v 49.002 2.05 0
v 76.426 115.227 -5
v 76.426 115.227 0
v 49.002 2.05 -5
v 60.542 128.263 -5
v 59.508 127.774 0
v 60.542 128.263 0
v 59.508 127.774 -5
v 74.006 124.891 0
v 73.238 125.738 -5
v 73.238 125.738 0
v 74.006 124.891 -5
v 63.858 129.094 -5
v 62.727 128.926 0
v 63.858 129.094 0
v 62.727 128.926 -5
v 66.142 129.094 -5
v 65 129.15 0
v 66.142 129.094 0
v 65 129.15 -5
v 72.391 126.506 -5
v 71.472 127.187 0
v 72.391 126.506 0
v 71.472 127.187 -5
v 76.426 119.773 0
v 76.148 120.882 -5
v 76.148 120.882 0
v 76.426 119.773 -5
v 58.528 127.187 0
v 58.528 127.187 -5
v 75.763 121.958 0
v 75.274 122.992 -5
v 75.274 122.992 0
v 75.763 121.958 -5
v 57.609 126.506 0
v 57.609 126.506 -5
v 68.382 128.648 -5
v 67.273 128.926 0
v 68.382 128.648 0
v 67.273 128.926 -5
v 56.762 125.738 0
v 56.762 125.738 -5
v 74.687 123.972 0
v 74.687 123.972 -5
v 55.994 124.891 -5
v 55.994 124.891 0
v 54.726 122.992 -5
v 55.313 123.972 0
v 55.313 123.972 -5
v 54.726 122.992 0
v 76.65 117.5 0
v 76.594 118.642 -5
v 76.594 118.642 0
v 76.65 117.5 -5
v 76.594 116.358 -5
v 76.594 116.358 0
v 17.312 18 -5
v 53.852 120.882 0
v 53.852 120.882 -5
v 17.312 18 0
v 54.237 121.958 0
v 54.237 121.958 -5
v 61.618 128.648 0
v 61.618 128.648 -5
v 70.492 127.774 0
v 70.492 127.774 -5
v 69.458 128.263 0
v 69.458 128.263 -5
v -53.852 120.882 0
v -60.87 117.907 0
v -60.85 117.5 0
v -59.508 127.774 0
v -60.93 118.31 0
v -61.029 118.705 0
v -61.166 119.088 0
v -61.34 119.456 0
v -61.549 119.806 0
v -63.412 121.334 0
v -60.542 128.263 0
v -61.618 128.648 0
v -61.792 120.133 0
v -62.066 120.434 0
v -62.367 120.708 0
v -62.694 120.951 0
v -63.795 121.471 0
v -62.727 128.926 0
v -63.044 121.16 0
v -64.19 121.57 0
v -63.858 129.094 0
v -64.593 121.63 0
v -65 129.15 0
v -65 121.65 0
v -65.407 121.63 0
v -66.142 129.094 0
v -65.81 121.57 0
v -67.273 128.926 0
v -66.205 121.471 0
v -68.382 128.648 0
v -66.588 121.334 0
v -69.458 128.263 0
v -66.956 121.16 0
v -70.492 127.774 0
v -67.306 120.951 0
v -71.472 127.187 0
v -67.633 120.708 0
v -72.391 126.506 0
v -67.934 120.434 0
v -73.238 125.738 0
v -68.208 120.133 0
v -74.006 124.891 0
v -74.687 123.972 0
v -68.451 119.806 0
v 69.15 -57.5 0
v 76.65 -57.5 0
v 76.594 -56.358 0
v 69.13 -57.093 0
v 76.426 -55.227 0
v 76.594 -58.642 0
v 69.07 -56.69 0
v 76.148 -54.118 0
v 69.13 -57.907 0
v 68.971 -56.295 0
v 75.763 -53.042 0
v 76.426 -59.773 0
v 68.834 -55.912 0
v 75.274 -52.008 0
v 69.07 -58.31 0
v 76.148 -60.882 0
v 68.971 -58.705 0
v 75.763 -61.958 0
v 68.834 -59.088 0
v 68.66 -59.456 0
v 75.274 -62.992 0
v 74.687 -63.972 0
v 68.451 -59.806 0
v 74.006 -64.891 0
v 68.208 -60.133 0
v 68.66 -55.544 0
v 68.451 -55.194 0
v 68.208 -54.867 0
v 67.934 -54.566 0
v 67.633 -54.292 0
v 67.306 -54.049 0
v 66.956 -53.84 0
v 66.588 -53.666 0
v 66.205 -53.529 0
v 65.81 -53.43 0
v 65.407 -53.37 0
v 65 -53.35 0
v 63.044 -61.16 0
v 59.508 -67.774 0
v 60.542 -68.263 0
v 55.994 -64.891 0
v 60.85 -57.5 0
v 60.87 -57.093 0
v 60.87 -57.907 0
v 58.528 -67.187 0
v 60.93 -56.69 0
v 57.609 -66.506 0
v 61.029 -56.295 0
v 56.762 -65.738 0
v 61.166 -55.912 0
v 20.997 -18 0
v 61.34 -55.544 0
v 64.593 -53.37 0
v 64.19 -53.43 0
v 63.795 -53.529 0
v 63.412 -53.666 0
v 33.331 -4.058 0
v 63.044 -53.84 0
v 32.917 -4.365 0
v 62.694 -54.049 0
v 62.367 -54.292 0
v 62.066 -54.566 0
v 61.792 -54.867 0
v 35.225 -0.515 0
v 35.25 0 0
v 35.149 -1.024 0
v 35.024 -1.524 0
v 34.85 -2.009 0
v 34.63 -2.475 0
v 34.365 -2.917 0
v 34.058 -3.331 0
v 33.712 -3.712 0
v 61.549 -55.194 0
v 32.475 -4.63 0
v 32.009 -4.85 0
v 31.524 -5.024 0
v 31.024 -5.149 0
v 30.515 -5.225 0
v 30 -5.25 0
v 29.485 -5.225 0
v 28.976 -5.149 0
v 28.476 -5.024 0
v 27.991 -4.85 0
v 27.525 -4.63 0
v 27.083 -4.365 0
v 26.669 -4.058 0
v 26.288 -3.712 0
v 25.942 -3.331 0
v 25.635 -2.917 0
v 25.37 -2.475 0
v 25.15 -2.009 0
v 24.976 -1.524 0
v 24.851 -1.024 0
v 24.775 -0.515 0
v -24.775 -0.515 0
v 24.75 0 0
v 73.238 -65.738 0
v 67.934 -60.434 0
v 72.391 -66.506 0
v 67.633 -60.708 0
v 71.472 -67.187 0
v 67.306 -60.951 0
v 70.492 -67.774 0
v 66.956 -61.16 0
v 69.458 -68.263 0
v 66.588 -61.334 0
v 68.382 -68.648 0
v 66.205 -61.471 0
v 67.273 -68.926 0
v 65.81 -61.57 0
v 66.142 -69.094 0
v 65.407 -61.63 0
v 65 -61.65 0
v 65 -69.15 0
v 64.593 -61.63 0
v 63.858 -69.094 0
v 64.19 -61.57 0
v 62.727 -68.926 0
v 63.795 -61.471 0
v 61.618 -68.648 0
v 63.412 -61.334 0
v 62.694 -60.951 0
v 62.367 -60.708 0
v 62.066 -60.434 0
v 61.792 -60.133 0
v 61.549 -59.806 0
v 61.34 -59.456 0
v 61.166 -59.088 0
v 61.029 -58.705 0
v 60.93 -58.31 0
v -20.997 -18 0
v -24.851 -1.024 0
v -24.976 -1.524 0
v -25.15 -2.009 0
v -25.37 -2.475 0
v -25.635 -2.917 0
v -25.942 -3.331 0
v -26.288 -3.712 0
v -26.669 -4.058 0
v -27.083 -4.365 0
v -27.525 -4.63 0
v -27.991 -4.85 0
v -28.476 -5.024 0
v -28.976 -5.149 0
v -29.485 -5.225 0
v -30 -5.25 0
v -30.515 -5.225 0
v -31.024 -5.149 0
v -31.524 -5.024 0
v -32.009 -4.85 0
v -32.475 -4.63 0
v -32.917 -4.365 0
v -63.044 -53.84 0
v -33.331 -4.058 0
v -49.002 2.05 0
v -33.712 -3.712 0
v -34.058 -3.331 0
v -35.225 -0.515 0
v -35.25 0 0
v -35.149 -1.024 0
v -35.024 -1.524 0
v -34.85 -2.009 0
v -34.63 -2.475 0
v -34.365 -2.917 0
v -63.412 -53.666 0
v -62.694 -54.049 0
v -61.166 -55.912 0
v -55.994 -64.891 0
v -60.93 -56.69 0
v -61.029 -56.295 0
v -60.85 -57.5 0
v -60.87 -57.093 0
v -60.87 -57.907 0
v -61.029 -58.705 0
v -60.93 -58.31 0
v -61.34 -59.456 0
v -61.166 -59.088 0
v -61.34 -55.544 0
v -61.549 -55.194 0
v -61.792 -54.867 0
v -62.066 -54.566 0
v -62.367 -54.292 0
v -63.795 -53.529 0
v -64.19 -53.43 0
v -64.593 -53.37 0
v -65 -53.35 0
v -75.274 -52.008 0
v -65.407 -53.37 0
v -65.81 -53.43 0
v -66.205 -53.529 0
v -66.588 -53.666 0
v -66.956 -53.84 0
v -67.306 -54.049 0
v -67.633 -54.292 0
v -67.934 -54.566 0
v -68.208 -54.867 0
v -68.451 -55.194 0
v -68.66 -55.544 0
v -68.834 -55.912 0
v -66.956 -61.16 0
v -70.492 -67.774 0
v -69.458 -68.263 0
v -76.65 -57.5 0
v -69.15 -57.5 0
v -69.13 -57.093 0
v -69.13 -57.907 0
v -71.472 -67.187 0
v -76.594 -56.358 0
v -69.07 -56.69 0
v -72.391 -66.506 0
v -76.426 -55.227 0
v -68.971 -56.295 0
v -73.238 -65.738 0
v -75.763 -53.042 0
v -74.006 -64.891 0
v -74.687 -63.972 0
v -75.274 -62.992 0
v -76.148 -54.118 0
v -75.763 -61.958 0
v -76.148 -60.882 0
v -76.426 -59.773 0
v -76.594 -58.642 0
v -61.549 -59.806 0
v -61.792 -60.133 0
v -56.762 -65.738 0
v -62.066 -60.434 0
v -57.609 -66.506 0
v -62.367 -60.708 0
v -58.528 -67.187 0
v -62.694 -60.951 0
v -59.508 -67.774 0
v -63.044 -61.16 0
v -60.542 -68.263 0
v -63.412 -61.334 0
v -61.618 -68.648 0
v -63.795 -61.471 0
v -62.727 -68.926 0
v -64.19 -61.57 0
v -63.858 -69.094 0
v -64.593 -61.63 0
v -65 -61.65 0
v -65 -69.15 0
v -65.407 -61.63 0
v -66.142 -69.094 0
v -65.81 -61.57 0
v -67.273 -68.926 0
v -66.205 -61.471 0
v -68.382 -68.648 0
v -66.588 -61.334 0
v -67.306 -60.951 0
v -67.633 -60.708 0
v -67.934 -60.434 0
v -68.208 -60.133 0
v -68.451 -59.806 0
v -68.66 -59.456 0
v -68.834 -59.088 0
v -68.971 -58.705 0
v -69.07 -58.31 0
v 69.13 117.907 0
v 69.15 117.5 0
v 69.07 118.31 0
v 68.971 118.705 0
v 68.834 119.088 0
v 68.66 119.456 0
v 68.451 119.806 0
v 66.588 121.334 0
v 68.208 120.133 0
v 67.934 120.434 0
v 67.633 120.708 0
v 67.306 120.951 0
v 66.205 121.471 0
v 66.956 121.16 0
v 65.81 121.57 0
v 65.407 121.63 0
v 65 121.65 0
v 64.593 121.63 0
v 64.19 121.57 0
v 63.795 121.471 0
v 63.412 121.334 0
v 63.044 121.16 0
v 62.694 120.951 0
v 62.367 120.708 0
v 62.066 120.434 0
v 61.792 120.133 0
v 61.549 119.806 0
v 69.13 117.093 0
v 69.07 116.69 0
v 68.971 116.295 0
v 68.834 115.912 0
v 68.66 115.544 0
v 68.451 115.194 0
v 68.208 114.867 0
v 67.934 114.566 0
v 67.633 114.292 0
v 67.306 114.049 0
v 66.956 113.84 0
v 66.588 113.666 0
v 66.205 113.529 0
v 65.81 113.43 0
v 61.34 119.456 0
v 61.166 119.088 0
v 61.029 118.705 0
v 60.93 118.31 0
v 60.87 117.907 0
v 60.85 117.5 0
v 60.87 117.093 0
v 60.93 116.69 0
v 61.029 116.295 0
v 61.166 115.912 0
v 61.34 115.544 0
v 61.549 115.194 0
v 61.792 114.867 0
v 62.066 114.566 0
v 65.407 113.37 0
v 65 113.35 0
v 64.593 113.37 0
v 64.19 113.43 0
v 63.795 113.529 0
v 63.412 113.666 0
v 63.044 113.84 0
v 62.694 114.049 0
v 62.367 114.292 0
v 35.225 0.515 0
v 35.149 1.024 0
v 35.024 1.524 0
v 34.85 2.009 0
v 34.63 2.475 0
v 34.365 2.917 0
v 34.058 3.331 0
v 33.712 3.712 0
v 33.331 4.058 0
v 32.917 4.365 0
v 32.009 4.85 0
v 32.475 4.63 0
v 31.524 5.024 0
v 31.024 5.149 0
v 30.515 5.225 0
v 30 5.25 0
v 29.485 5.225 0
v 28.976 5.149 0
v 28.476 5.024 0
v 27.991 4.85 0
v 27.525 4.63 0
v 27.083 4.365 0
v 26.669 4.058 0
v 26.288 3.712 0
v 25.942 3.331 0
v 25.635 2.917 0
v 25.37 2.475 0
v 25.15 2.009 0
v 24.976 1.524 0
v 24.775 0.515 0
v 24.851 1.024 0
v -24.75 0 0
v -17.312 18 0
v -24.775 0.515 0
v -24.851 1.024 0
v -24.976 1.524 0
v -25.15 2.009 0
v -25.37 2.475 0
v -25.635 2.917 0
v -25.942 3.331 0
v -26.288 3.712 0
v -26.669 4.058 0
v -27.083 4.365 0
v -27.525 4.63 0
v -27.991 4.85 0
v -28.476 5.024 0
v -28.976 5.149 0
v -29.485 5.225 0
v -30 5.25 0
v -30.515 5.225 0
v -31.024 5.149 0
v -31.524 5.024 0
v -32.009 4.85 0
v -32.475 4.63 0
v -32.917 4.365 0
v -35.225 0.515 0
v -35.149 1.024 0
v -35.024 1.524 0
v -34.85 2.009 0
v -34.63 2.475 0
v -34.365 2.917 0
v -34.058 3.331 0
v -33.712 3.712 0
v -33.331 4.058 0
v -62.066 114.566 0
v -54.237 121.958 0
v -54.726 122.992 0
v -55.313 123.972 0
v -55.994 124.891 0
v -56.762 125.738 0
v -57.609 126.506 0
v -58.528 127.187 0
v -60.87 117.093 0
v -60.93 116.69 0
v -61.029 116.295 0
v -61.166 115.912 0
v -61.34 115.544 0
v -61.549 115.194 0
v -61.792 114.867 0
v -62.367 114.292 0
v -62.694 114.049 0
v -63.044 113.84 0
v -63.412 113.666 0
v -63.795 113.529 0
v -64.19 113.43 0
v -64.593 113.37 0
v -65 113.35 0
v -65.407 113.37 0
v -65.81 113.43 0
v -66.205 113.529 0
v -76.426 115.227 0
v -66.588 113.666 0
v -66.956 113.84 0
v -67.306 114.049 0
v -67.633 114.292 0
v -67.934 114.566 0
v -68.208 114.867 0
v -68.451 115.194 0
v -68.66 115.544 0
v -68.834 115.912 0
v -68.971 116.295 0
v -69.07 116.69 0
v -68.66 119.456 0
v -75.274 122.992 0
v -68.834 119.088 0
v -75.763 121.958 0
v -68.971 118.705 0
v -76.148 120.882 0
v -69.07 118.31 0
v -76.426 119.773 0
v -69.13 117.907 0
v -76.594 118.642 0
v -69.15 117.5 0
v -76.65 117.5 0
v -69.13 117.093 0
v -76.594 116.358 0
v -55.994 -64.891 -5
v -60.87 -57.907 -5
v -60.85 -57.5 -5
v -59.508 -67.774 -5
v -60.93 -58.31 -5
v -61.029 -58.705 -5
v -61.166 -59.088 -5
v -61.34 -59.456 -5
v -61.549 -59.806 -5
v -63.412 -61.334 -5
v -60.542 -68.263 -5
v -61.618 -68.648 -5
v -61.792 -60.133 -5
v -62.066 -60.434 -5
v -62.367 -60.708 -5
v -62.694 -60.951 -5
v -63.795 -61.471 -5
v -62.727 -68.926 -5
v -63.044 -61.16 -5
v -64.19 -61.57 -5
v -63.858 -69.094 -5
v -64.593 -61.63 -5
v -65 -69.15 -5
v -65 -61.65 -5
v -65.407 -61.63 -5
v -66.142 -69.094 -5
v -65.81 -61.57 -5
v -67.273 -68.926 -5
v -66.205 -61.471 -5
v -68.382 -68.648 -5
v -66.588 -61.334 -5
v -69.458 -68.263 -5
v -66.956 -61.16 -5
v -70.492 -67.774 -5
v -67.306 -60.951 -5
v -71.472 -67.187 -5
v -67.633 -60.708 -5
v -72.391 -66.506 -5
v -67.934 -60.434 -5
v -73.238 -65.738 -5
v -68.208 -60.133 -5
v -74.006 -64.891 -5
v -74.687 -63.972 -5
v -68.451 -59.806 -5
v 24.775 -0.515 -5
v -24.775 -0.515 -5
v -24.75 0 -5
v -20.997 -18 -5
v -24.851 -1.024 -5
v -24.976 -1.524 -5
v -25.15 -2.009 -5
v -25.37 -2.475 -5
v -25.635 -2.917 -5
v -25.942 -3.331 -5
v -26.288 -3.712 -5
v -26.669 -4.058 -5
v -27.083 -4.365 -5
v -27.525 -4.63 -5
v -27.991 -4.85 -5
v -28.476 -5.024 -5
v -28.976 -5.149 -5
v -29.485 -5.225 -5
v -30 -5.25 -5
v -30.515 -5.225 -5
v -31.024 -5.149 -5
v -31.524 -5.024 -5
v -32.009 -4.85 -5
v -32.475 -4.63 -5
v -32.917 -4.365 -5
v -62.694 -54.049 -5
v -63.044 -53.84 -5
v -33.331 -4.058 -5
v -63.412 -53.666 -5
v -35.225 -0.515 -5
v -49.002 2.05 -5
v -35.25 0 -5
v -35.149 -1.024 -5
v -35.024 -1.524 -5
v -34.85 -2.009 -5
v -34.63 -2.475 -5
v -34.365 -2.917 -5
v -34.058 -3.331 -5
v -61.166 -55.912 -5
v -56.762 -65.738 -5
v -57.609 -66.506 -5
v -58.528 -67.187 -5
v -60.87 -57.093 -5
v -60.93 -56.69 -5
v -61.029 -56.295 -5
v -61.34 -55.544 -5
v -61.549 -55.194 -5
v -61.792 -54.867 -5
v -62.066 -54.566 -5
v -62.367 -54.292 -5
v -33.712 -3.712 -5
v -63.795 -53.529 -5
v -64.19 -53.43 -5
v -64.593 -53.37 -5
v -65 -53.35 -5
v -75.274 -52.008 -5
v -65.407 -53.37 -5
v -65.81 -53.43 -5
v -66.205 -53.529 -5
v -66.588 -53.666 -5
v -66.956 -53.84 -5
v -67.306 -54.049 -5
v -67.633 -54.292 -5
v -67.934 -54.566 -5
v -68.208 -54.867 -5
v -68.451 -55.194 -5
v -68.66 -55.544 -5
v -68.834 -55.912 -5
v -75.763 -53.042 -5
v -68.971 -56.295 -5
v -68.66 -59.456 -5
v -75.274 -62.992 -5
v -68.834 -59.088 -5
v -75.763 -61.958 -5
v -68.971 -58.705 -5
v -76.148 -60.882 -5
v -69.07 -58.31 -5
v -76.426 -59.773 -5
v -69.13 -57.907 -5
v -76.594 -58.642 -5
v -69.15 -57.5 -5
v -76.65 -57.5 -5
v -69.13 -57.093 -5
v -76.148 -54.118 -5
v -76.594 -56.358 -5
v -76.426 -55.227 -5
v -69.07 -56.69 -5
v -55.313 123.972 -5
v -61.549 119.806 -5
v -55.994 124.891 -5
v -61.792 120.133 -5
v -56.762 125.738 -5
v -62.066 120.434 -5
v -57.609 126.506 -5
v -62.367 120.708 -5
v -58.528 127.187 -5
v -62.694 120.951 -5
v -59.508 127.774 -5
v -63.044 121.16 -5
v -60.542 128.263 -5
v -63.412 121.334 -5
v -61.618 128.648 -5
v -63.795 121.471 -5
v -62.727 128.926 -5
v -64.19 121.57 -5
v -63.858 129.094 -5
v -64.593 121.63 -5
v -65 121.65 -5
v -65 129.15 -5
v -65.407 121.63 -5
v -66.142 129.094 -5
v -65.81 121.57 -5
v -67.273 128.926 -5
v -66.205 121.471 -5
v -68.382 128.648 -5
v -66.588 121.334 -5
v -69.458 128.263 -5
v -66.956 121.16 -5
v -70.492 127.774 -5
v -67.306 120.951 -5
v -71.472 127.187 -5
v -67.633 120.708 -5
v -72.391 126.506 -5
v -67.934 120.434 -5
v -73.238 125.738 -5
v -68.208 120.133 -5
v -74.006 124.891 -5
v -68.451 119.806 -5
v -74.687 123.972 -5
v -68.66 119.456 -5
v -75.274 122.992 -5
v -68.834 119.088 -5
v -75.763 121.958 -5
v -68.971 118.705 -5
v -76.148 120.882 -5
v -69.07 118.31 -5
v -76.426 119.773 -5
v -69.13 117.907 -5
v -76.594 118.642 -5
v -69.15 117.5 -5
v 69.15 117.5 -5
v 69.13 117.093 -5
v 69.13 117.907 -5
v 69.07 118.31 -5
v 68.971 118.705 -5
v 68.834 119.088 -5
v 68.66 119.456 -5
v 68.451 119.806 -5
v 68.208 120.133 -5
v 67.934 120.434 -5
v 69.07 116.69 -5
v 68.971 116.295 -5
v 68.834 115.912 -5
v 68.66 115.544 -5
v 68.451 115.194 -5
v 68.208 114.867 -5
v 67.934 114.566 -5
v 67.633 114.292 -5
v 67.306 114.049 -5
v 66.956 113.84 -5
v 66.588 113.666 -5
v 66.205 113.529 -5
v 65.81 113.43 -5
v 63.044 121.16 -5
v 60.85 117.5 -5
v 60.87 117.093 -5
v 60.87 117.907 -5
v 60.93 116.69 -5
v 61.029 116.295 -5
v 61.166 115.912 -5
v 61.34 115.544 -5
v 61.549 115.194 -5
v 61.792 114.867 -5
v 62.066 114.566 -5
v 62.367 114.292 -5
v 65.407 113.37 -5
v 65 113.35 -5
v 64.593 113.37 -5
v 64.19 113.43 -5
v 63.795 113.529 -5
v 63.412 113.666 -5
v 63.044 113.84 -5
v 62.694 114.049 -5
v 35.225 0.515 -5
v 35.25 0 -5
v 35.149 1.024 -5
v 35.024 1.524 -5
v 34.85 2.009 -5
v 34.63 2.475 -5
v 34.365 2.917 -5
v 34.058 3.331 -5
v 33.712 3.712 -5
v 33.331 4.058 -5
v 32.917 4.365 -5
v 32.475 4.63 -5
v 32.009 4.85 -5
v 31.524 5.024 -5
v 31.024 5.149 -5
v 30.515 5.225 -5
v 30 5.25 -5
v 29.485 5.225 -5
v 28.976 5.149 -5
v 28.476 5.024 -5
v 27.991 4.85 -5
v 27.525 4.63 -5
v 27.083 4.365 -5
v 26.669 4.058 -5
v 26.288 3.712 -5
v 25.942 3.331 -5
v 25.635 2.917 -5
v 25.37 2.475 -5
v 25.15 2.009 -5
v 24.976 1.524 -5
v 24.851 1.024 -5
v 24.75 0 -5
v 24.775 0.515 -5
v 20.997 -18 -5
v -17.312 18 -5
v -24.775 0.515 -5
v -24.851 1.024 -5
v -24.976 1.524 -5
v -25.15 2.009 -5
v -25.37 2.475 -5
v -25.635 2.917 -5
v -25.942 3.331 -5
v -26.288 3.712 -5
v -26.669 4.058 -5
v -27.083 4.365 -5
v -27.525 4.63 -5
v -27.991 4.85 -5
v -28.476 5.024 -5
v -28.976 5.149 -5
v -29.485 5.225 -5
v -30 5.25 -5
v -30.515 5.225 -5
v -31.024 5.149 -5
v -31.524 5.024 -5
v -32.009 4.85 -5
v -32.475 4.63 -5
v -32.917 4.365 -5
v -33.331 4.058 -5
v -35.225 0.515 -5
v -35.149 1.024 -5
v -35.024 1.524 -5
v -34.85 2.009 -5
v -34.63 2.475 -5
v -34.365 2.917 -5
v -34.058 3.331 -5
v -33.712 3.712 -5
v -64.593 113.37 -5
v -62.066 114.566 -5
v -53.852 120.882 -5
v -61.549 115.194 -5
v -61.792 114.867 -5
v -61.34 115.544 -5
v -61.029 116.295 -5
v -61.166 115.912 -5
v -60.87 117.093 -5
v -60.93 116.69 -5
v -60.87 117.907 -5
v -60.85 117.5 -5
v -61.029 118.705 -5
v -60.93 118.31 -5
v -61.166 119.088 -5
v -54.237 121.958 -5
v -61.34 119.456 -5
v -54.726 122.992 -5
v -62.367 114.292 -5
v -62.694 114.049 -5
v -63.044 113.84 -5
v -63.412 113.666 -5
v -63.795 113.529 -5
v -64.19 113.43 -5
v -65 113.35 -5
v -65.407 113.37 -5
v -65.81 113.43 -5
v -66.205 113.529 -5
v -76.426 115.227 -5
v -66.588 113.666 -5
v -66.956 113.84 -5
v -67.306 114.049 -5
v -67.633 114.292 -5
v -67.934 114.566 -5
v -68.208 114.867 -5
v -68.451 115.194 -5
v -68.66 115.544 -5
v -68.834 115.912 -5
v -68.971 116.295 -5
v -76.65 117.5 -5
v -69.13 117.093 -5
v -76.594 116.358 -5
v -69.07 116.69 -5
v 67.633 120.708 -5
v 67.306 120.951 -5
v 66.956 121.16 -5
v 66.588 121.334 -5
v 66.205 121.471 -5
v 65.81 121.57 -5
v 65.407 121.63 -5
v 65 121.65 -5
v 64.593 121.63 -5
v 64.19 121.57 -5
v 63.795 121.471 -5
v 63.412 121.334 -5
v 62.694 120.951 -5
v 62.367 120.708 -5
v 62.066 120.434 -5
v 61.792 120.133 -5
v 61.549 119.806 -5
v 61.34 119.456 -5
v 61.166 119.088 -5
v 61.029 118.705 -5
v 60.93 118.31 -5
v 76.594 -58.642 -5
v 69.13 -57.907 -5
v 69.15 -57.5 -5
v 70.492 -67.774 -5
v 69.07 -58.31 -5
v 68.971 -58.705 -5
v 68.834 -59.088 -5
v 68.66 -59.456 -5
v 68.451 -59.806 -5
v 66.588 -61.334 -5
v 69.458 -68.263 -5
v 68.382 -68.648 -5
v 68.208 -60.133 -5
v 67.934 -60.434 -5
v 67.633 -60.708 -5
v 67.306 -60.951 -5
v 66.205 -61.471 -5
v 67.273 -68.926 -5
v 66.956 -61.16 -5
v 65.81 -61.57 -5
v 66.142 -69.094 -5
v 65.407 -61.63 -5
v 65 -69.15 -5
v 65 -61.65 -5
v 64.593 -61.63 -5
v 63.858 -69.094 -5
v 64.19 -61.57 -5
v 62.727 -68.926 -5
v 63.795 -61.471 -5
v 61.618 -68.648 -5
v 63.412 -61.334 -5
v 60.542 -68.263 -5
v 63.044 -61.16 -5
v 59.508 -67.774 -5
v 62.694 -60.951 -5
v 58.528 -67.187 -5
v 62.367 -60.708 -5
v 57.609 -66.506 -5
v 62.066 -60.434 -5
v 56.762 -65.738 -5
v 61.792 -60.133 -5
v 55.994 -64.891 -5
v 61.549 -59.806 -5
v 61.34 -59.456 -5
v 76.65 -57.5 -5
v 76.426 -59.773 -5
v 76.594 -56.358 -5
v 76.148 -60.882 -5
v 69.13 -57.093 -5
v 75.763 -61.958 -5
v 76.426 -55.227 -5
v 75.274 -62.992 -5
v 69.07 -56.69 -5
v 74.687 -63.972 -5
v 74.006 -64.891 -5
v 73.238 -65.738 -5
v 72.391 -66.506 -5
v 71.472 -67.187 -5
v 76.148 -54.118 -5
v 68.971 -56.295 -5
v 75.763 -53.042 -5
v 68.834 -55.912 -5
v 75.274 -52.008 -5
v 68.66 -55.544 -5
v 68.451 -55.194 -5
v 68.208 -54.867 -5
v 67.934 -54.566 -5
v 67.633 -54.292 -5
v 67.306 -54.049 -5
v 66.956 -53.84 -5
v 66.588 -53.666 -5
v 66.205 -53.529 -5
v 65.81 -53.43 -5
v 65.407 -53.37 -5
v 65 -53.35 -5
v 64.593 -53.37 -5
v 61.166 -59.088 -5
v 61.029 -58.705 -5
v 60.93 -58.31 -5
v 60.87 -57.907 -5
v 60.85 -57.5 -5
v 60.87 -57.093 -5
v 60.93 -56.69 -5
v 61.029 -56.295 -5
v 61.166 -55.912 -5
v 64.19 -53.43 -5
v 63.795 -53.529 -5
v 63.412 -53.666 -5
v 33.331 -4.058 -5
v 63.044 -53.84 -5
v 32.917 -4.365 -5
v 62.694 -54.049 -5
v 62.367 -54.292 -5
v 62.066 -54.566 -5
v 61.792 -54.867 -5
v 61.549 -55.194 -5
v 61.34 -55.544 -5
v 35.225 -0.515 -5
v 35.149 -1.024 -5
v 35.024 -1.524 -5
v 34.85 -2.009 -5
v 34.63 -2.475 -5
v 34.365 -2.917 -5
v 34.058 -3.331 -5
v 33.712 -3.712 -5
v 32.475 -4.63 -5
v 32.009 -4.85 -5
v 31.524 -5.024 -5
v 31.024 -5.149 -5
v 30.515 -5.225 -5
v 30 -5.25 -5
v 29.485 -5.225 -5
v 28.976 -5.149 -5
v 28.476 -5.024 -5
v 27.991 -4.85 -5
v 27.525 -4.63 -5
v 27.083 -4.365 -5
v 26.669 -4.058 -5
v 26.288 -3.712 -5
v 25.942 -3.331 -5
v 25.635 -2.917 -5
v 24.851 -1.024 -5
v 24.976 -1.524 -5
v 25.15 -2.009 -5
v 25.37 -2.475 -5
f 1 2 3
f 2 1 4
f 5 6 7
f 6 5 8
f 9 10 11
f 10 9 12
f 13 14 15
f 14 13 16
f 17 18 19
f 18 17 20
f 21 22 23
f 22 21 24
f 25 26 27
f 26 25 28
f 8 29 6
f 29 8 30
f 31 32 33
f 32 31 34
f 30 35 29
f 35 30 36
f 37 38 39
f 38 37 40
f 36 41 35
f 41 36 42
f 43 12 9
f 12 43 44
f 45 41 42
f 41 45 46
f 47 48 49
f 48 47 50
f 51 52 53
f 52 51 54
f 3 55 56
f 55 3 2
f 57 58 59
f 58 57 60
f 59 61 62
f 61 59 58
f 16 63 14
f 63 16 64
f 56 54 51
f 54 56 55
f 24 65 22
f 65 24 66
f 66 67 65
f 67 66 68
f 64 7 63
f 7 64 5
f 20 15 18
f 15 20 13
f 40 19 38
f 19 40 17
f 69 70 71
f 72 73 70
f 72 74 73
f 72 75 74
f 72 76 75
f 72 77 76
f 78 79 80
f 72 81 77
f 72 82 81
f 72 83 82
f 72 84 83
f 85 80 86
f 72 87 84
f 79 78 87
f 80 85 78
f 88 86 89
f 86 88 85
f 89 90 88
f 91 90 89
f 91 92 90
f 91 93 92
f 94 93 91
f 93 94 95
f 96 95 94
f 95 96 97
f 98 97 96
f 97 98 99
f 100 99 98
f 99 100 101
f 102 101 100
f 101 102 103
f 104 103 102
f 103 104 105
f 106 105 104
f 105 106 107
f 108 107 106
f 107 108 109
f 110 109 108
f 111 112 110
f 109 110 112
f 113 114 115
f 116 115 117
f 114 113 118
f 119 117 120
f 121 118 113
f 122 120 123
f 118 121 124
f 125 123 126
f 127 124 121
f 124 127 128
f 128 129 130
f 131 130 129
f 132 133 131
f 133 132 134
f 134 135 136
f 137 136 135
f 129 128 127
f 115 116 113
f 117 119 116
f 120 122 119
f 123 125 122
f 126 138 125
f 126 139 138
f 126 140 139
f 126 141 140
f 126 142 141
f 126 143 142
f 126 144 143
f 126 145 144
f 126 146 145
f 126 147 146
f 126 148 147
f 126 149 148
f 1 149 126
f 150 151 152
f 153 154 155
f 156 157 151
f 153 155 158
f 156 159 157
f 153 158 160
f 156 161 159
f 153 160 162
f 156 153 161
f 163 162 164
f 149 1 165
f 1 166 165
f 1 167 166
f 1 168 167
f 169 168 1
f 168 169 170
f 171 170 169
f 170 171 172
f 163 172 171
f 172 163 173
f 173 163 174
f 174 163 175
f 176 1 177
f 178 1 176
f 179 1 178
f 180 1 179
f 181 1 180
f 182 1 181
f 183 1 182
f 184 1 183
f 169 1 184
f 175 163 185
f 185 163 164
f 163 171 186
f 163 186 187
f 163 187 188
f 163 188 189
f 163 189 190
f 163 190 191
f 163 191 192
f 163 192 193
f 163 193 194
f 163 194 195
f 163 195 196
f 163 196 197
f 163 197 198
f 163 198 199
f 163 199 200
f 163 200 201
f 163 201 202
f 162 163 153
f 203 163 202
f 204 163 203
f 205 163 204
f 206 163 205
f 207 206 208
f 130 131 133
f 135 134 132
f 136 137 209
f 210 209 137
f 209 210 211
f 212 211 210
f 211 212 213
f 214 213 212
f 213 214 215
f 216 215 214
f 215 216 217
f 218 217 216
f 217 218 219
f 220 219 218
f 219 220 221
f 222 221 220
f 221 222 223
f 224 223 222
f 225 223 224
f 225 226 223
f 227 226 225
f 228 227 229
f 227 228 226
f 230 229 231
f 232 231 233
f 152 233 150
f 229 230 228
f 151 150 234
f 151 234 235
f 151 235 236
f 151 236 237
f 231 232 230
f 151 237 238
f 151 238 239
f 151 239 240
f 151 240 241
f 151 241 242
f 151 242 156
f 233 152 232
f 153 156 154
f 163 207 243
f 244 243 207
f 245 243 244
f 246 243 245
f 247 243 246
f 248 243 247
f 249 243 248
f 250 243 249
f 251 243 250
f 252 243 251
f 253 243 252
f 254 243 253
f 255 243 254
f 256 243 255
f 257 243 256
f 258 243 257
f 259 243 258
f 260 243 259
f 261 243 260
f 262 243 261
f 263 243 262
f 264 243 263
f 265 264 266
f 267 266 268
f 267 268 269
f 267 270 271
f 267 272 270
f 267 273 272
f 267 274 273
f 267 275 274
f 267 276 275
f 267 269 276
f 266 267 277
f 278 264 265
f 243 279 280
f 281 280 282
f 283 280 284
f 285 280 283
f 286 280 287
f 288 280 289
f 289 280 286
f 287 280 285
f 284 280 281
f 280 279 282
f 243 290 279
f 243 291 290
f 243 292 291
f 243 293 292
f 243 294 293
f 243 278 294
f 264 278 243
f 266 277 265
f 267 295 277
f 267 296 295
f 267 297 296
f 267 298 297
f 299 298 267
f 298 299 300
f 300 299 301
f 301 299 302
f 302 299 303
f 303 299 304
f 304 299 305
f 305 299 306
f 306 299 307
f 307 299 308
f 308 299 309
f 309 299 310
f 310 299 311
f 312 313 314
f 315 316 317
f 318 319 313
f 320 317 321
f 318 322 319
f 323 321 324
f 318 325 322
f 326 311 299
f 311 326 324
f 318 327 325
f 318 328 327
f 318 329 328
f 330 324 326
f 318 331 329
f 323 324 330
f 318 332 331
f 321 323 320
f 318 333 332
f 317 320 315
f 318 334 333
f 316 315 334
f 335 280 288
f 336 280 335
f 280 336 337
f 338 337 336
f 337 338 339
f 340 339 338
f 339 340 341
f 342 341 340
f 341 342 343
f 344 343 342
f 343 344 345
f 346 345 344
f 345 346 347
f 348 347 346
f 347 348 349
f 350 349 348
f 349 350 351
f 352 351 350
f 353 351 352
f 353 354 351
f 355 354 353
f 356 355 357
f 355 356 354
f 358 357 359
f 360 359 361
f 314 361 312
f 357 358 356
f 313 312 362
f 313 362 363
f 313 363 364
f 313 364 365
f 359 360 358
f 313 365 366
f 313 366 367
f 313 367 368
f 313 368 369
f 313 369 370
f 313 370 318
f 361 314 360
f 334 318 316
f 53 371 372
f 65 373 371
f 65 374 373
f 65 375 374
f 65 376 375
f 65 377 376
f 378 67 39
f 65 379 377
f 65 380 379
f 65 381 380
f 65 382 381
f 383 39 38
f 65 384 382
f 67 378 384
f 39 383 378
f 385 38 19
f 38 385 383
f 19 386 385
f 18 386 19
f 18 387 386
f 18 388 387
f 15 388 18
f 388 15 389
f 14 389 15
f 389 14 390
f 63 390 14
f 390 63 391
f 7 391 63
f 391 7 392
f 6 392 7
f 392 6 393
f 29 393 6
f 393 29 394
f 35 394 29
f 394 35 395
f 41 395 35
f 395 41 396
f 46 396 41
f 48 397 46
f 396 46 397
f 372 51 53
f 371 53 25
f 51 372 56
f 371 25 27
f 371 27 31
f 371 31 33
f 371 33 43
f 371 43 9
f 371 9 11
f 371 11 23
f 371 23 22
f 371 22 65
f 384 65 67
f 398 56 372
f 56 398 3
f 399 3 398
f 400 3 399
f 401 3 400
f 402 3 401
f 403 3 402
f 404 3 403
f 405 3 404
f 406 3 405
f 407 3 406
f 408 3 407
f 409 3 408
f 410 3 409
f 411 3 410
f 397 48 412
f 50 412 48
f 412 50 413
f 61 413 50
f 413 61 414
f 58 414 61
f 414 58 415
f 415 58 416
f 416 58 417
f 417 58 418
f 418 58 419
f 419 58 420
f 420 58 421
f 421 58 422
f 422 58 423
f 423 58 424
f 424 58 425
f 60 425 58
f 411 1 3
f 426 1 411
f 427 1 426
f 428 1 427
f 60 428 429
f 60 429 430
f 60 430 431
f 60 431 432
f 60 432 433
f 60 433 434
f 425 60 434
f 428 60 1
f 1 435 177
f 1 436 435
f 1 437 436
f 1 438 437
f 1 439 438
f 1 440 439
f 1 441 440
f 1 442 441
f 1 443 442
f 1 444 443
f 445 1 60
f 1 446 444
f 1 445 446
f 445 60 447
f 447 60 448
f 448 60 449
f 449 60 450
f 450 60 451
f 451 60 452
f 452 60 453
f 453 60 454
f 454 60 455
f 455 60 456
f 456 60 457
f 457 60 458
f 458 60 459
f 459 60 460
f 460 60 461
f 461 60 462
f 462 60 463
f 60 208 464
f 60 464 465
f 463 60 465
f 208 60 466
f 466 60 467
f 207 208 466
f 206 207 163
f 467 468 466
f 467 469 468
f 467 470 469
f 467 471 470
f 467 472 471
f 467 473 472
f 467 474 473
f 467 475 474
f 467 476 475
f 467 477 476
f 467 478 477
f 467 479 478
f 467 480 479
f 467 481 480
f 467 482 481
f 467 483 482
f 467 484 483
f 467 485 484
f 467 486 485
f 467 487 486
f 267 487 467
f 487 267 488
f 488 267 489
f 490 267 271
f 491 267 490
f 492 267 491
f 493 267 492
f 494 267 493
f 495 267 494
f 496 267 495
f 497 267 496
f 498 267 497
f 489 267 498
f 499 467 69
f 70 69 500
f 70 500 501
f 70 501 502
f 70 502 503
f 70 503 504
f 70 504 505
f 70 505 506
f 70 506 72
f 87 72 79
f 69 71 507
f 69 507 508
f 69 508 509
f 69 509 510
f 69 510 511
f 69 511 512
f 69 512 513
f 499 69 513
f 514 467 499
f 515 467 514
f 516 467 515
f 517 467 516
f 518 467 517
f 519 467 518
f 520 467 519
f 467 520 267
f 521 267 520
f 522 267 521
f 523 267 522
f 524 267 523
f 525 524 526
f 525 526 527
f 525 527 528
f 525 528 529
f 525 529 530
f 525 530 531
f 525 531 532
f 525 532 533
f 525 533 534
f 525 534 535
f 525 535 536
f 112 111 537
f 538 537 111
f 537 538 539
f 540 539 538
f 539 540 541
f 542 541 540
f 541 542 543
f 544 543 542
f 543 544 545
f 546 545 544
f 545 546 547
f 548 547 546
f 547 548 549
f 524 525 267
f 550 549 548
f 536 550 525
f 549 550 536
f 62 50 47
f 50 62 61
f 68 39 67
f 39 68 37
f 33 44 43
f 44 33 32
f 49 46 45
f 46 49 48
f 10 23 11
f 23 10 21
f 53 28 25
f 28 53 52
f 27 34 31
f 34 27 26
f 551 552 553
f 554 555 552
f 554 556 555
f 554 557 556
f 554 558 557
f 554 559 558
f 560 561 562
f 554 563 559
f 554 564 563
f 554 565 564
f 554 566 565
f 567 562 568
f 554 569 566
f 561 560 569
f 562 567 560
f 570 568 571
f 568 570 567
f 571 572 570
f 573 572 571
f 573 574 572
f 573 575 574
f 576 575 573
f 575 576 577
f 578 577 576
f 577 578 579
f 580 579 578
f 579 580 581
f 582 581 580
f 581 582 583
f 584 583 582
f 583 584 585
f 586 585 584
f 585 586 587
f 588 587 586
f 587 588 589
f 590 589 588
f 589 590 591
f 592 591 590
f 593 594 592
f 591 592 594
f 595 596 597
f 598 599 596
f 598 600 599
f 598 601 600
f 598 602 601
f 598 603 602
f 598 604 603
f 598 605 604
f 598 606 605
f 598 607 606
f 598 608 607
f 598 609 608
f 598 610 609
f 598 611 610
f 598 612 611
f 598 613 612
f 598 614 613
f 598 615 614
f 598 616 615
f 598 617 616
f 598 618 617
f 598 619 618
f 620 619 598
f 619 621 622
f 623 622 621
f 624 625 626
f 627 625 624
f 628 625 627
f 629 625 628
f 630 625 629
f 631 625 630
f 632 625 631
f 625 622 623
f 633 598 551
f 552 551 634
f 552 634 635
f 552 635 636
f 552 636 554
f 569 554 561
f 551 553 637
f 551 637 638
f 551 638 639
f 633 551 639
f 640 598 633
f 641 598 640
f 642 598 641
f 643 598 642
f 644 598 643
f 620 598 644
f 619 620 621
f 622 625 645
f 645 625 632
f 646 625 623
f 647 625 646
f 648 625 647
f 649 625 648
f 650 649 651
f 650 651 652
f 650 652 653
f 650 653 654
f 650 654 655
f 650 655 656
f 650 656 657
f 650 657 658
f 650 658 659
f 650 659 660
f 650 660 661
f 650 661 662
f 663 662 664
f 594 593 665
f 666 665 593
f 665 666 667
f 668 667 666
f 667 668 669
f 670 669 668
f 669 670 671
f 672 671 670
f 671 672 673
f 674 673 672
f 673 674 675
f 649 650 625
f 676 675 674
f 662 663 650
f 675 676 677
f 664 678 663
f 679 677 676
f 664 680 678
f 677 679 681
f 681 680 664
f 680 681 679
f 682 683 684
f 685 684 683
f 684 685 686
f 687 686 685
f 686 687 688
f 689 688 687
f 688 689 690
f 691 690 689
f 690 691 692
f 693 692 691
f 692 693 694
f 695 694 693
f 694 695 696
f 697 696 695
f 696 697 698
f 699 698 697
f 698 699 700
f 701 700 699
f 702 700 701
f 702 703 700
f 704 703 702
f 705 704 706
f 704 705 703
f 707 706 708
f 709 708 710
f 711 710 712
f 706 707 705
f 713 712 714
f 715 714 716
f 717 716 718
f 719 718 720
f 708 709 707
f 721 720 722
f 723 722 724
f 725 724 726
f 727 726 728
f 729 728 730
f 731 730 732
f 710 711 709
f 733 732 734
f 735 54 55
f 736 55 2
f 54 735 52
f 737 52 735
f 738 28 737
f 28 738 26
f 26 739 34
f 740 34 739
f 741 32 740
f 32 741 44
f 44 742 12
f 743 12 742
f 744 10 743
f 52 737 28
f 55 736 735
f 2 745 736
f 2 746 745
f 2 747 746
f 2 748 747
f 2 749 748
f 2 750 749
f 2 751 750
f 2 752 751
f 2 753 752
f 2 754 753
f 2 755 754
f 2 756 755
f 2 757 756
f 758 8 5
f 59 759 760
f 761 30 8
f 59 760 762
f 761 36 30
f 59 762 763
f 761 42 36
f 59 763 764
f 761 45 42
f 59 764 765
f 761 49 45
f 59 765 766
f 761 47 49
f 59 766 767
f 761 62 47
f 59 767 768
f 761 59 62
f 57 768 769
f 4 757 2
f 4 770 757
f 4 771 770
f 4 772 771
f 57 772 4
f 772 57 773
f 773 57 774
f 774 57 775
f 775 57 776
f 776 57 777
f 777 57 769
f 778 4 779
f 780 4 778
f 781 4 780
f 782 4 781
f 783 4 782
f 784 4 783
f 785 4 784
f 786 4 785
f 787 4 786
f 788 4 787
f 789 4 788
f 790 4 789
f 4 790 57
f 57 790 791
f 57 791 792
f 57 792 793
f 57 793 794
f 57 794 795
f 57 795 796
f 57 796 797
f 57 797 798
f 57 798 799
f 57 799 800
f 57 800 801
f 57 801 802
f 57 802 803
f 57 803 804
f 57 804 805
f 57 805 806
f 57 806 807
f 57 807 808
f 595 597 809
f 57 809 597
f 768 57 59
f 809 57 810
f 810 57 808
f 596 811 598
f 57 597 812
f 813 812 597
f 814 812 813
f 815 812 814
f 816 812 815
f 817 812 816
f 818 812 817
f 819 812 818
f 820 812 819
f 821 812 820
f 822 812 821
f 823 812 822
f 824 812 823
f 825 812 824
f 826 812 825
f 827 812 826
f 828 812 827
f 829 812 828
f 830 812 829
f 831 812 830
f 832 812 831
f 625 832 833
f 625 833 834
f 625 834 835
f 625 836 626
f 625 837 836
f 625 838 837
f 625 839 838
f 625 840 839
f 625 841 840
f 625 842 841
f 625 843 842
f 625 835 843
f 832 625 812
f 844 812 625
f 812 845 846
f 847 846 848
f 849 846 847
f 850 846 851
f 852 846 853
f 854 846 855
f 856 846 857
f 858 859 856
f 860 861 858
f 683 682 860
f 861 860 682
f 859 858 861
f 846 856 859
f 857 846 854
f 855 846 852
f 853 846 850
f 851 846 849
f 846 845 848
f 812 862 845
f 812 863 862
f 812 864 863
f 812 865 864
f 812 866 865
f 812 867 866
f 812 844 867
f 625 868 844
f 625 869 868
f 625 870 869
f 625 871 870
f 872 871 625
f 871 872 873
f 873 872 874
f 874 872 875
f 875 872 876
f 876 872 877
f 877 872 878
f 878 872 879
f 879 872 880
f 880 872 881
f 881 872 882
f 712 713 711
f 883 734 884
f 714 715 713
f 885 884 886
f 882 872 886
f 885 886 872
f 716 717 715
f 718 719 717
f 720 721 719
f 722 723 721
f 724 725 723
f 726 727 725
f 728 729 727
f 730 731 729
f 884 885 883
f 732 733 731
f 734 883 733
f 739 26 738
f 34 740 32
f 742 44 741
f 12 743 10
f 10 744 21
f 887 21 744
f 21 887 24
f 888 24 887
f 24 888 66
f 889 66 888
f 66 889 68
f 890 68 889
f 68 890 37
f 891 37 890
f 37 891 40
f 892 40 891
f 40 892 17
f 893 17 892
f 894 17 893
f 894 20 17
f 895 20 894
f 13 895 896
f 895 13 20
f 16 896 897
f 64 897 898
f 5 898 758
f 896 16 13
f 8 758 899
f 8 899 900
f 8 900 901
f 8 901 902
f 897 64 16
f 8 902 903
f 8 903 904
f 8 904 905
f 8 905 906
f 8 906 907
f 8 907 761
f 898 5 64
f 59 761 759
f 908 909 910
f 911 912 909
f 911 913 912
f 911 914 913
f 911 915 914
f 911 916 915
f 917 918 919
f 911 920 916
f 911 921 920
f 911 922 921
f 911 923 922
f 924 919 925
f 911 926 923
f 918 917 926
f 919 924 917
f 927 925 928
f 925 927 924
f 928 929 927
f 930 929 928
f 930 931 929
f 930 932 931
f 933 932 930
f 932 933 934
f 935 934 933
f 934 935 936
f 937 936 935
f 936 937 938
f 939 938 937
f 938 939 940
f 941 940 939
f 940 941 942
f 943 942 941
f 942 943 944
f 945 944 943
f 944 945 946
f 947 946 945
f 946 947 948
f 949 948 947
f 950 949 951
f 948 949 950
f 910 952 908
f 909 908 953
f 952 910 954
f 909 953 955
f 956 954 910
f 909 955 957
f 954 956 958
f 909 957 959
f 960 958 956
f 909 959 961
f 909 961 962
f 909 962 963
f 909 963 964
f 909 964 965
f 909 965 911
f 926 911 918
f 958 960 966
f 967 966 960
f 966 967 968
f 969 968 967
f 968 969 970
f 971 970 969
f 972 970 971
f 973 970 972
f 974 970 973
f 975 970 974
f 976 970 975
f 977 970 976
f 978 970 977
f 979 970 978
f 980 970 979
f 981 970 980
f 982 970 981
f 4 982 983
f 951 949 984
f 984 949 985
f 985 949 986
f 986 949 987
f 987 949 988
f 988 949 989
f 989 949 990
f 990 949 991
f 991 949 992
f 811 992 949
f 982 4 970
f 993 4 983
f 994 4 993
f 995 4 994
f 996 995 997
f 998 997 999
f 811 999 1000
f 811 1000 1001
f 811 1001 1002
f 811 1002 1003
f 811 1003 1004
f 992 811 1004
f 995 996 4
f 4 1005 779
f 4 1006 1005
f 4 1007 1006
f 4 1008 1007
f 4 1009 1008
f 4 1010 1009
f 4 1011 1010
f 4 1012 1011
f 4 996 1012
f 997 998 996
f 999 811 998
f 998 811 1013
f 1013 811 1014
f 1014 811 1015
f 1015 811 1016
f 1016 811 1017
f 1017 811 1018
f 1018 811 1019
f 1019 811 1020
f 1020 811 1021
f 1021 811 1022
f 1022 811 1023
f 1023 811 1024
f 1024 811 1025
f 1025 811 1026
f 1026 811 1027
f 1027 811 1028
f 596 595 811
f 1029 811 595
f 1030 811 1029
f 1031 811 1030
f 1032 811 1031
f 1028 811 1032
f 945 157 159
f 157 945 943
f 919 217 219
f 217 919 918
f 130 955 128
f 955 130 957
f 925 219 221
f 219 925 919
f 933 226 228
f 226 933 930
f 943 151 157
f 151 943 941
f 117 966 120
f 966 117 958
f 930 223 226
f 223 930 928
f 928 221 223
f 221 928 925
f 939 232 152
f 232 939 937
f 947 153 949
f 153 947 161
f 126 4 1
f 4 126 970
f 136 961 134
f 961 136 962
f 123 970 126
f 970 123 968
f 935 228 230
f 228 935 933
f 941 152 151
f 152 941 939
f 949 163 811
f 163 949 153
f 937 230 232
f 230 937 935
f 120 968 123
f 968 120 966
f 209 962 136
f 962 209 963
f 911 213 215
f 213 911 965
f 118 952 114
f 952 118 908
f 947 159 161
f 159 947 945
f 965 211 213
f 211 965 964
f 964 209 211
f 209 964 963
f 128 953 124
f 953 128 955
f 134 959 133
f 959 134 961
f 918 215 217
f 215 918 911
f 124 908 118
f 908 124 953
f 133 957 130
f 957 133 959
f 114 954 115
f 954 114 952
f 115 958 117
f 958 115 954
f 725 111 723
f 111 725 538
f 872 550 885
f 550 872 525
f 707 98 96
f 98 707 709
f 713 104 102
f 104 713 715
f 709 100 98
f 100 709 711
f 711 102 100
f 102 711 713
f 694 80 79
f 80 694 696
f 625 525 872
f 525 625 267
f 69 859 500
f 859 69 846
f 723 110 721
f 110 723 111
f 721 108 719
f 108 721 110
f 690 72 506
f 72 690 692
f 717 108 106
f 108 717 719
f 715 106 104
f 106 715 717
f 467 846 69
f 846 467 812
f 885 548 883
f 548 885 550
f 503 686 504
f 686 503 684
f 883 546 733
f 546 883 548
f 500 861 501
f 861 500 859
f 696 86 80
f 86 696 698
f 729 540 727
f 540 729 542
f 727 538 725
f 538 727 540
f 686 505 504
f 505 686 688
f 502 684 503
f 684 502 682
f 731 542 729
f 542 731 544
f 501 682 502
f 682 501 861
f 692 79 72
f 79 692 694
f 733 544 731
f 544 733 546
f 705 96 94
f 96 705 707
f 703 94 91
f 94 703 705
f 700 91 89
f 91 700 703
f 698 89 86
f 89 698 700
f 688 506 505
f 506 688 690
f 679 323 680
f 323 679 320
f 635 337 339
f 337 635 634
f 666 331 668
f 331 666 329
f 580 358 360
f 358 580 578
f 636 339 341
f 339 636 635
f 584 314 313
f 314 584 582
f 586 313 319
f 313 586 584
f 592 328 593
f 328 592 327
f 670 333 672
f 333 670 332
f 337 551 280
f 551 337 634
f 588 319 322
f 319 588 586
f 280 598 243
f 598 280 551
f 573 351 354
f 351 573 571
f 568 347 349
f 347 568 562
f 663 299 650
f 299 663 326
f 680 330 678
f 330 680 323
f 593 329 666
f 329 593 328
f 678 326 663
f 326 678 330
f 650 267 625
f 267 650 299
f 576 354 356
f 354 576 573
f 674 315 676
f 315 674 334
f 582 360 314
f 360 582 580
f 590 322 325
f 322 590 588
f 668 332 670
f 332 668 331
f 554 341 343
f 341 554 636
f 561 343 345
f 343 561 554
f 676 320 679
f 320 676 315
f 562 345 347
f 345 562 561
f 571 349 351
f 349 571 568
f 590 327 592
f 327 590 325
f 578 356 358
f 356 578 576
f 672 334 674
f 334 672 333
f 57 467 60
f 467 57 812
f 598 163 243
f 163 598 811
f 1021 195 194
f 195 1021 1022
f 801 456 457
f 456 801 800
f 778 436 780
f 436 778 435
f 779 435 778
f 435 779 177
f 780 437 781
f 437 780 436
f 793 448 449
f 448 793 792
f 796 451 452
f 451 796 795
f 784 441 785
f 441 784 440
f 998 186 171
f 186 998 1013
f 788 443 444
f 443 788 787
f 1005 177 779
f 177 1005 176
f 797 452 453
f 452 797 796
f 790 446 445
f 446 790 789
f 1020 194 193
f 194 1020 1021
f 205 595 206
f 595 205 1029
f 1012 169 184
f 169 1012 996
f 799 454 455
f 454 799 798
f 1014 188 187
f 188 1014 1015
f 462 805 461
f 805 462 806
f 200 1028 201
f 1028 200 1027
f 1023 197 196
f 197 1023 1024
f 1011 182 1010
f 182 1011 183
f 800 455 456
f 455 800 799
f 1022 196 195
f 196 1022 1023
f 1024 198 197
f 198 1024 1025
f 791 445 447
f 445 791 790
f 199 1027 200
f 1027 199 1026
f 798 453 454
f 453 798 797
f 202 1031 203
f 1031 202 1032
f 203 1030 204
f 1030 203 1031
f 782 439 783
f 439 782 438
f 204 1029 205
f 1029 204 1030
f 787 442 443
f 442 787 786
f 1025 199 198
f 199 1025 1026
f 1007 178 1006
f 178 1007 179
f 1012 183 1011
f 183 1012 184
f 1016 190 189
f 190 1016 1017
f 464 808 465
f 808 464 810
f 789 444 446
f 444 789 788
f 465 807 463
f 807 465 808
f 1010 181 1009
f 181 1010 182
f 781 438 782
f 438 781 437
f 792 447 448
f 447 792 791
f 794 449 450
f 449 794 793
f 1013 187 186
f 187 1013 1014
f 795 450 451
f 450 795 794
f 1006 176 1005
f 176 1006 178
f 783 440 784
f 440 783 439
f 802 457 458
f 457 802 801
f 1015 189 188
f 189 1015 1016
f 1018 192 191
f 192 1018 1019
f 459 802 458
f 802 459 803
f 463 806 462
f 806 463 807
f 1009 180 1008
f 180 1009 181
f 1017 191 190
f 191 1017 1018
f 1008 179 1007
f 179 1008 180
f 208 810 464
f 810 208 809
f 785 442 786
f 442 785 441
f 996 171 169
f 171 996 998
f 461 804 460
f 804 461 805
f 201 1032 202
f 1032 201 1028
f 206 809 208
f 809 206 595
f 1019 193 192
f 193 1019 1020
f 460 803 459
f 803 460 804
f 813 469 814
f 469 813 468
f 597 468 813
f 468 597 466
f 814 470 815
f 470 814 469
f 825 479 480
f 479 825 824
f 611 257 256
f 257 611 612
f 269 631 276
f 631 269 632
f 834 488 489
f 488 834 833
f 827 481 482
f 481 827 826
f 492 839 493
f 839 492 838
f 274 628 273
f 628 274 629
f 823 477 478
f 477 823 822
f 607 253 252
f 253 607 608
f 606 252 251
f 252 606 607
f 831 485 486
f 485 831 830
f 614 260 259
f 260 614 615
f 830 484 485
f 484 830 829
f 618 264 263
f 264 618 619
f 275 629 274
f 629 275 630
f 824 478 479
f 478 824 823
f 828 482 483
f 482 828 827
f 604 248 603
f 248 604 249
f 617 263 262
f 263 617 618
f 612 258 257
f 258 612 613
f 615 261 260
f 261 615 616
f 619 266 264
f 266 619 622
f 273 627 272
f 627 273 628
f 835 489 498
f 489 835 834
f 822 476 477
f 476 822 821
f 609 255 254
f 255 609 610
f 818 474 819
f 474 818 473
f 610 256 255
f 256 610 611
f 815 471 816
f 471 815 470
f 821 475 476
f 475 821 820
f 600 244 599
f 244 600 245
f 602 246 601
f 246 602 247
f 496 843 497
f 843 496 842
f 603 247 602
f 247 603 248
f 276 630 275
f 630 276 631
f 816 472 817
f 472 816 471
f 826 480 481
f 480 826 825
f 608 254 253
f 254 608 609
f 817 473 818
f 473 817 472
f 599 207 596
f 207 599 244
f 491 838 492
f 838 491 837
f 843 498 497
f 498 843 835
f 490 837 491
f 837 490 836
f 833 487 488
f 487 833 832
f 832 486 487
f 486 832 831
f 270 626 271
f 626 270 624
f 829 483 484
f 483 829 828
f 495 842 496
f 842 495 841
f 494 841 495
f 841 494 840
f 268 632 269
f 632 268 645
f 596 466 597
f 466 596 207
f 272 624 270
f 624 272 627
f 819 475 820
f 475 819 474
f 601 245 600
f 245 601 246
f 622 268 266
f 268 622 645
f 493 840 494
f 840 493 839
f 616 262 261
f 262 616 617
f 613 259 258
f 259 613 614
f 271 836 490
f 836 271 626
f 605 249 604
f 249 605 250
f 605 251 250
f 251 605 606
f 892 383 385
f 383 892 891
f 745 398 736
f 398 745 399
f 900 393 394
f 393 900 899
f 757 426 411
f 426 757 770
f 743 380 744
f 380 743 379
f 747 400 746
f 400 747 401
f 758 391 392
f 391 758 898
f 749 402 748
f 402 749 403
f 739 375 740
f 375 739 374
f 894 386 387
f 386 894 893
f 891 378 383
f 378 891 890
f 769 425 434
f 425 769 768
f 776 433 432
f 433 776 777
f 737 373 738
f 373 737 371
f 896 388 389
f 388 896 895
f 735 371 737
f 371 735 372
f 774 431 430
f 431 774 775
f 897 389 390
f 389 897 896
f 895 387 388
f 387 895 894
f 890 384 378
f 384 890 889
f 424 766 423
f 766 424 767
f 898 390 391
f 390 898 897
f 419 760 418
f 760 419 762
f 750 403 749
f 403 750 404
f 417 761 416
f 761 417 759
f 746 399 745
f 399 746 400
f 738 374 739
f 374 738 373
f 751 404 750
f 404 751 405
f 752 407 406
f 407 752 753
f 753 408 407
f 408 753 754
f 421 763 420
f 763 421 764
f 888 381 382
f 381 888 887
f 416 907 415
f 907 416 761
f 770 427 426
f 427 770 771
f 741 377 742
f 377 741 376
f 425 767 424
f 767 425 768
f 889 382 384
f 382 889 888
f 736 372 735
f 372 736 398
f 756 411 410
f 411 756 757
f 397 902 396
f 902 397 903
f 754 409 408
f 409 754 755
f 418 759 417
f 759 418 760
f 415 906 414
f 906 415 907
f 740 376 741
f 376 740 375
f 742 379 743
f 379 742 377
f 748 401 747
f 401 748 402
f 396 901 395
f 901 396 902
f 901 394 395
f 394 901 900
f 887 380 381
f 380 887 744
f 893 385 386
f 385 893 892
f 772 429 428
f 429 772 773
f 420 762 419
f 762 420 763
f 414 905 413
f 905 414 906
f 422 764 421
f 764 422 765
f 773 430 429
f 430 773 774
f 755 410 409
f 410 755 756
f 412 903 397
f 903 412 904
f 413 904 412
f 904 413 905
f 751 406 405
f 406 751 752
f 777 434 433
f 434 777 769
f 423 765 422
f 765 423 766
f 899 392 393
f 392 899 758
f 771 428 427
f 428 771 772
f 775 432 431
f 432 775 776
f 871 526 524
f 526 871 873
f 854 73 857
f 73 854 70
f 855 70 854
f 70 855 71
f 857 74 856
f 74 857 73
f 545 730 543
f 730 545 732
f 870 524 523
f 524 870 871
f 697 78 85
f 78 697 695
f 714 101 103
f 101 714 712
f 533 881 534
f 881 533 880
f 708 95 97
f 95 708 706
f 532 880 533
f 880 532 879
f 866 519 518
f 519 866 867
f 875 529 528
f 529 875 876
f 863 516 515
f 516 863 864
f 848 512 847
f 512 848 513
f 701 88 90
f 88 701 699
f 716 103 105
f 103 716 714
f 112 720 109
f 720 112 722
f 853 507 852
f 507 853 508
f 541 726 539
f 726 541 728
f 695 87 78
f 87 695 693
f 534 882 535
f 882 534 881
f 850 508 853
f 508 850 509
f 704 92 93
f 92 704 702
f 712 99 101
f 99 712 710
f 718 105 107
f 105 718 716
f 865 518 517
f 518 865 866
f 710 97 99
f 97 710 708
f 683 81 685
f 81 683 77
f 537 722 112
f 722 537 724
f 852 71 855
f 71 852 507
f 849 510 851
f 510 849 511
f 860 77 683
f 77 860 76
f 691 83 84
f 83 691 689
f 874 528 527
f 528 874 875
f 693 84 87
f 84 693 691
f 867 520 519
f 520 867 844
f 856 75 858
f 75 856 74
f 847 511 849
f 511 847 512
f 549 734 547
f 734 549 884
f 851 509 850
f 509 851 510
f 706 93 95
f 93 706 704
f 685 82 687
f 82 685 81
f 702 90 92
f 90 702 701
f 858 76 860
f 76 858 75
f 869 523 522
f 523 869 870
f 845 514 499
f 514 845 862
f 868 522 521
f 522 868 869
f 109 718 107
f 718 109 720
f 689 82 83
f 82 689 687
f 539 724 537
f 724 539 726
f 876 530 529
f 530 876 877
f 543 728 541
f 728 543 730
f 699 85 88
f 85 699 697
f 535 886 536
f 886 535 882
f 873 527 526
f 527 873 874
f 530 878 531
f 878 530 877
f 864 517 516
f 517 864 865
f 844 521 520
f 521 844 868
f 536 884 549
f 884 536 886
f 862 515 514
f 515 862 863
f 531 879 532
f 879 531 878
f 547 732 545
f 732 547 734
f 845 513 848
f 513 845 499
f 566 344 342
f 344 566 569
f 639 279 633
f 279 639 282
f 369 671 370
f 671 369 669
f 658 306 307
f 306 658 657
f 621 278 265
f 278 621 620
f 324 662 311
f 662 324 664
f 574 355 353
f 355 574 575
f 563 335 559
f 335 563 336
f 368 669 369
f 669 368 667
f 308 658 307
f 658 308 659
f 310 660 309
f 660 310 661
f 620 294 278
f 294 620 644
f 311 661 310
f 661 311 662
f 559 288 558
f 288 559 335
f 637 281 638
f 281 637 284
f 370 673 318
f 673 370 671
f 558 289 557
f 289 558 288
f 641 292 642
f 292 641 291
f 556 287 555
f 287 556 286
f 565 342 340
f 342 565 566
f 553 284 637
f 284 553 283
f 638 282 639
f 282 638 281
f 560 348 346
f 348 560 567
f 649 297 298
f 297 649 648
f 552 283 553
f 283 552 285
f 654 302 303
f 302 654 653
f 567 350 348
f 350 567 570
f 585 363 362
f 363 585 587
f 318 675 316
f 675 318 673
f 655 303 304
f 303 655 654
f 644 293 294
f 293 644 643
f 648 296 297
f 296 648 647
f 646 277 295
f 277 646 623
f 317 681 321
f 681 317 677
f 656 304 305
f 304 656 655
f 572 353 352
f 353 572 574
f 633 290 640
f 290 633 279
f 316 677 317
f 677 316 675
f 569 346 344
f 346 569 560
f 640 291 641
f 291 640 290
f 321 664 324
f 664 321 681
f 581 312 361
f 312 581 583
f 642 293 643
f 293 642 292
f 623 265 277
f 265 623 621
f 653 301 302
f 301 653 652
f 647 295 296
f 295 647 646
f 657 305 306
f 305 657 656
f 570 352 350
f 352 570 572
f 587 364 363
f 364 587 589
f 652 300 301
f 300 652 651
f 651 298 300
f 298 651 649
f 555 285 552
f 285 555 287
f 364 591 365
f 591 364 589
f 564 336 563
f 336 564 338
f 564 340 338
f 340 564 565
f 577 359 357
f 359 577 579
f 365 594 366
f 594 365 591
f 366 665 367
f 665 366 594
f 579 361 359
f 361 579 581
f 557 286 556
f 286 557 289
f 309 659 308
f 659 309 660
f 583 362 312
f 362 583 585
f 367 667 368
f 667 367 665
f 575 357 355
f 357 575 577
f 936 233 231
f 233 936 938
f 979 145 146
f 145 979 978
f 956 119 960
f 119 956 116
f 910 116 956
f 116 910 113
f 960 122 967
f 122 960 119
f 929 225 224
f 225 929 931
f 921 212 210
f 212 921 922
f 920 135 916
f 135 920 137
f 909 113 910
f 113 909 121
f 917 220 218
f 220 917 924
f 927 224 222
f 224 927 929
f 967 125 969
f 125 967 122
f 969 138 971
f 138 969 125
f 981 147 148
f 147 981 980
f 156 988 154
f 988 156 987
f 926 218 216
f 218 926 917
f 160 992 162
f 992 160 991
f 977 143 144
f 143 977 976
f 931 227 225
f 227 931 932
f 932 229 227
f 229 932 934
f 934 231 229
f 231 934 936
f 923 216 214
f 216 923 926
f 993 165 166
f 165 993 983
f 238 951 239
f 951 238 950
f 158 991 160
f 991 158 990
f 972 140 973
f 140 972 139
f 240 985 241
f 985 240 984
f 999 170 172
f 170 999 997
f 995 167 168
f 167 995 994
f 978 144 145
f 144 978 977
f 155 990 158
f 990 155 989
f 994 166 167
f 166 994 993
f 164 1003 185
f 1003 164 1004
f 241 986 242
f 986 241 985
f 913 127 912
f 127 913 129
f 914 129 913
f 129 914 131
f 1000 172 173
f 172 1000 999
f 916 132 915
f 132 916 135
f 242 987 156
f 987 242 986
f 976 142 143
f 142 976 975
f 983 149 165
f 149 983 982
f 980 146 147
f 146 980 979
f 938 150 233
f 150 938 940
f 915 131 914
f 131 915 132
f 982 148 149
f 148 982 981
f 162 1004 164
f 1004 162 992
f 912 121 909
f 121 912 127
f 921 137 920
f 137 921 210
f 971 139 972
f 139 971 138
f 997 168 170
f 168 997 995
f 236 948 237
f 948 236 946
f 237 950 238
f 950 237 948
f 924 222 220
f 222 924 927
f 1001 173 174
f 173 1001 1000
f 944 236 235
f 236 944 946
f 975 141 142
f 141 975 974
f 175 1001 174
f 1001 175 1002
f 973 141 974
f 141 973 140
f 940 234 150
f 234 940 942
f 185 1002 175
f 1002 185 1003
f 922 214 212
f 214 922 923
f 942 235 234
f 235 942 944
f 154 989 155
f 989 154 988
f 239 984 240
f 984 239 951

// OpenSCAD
// file: configuration.scad
//Global variables: roddia, tunerodia, roddistance, screedlength, railroddia,stringholes


height=900; //overall height
roddia=10.5; //diameter of the main two rods
roddistance=60; //distance of the main two rods
tuneroddia=8.3; //diameter of the tunerod


pivotdia=20;
screedlength=130;
screedwidth=35;
screedheight=18;
stringroddist=screedlength-pivotdia;
stringdia=3.5;
stiffroddia=6.5;
pivotoffset=0;
stringholenumber=6;
stringholespread=5;

railrodZdist=20;
raildistance=35;
raildia=10.3;
railZ=250;



$fn=64;



basecolor=[0.2,0.2,0.2];    
actcolor=[0,0,1];

rodcolor=[0.5,0.5,0.5];
railcolor=[0.8,0.8,0.8];
boltcolor=[0.8,0.8,0.8];
// main file
include <configuration.scad>;



module stand(type){
height=5;
distX=130;
distY=175;
Yoffset=30;
screw_dia=8.3;

    tunerodholelength=pivotdia;
    screedholelength=15;
translate([0,0,-height/2]){
difference(){
union(){
hull(){
translate([roddistance/2,0,0]){
cylinder(d=screedholelength+roddia*2,h=height,center=true);}
translate([distX/2,distY/2+Yoffset,0]){
cylinder(d=screedholelength+screw_dia,h=height,center=true);}
}
hull(){
translate([roddistance/2,0,0]){
cylinder(d=screedholelength+roddia*2,h=height,center=true);}
translate([distX/2,-distY/2+Yoffset,0]){
cylinder(d=screedholelength+screw_dia,h=height,center=true);}
}
hull(){
translate([-roddistance/2,0,0]){
cylinder(d=screedholelength+roddia*2,h=height,center=true);}
translate([-distX/2,distY/2+Yoffset,0]){
cylinder(d=screedholelength++screw_dia,h=height,center=true);}
}
hull(){
translate([-roddistance/2,0,0]){
cylinder(d=screedholelength+roddia*2,h=height,center=true);}
translate([-distX/2,-distY/2+Yoffset,0]){
cylinder(d=screedholelength+screw_dia,h=height,center=true);}
}
hull(){
translate([roddistance/2,0,0]){
cylinder(d=screedholelength+roddia*2,h=height,center=true);}
translate([-roddistance/2,0,0]){
cylinder(d=screedholelength+roddia*2,h=height,center=true);}
}
}
//translate([-roddistance/2,0,0]){
//cylinder(d=screedholelength+roddia*2,h=height,center=true);}


translate([roddistance/2,0,0]){
cylinder(d=roddia,h=height,center=true);}
translate([-roddistance/2,0,0]){
cylinder(d=roddia,h=height,center=true);}

translate([distX/2,distY/2+Yoffset,0]){
cylinder(d=screw_dia,h=height,center=true);}
translate([-distX/2,distY/2+Yoffset,0]){
cylinder(d=screw_dia,h=height,center=true);}
translate([-distX/2,-distY/2+Yoffset,0]){
cylinder(d=screw_dia,h=height,center=true);}
translate([distX/2,-distY/2+Yoffset,0]){
cylinder(d=screw_dia,h=height,center=true);}

}




}
}



stand();
